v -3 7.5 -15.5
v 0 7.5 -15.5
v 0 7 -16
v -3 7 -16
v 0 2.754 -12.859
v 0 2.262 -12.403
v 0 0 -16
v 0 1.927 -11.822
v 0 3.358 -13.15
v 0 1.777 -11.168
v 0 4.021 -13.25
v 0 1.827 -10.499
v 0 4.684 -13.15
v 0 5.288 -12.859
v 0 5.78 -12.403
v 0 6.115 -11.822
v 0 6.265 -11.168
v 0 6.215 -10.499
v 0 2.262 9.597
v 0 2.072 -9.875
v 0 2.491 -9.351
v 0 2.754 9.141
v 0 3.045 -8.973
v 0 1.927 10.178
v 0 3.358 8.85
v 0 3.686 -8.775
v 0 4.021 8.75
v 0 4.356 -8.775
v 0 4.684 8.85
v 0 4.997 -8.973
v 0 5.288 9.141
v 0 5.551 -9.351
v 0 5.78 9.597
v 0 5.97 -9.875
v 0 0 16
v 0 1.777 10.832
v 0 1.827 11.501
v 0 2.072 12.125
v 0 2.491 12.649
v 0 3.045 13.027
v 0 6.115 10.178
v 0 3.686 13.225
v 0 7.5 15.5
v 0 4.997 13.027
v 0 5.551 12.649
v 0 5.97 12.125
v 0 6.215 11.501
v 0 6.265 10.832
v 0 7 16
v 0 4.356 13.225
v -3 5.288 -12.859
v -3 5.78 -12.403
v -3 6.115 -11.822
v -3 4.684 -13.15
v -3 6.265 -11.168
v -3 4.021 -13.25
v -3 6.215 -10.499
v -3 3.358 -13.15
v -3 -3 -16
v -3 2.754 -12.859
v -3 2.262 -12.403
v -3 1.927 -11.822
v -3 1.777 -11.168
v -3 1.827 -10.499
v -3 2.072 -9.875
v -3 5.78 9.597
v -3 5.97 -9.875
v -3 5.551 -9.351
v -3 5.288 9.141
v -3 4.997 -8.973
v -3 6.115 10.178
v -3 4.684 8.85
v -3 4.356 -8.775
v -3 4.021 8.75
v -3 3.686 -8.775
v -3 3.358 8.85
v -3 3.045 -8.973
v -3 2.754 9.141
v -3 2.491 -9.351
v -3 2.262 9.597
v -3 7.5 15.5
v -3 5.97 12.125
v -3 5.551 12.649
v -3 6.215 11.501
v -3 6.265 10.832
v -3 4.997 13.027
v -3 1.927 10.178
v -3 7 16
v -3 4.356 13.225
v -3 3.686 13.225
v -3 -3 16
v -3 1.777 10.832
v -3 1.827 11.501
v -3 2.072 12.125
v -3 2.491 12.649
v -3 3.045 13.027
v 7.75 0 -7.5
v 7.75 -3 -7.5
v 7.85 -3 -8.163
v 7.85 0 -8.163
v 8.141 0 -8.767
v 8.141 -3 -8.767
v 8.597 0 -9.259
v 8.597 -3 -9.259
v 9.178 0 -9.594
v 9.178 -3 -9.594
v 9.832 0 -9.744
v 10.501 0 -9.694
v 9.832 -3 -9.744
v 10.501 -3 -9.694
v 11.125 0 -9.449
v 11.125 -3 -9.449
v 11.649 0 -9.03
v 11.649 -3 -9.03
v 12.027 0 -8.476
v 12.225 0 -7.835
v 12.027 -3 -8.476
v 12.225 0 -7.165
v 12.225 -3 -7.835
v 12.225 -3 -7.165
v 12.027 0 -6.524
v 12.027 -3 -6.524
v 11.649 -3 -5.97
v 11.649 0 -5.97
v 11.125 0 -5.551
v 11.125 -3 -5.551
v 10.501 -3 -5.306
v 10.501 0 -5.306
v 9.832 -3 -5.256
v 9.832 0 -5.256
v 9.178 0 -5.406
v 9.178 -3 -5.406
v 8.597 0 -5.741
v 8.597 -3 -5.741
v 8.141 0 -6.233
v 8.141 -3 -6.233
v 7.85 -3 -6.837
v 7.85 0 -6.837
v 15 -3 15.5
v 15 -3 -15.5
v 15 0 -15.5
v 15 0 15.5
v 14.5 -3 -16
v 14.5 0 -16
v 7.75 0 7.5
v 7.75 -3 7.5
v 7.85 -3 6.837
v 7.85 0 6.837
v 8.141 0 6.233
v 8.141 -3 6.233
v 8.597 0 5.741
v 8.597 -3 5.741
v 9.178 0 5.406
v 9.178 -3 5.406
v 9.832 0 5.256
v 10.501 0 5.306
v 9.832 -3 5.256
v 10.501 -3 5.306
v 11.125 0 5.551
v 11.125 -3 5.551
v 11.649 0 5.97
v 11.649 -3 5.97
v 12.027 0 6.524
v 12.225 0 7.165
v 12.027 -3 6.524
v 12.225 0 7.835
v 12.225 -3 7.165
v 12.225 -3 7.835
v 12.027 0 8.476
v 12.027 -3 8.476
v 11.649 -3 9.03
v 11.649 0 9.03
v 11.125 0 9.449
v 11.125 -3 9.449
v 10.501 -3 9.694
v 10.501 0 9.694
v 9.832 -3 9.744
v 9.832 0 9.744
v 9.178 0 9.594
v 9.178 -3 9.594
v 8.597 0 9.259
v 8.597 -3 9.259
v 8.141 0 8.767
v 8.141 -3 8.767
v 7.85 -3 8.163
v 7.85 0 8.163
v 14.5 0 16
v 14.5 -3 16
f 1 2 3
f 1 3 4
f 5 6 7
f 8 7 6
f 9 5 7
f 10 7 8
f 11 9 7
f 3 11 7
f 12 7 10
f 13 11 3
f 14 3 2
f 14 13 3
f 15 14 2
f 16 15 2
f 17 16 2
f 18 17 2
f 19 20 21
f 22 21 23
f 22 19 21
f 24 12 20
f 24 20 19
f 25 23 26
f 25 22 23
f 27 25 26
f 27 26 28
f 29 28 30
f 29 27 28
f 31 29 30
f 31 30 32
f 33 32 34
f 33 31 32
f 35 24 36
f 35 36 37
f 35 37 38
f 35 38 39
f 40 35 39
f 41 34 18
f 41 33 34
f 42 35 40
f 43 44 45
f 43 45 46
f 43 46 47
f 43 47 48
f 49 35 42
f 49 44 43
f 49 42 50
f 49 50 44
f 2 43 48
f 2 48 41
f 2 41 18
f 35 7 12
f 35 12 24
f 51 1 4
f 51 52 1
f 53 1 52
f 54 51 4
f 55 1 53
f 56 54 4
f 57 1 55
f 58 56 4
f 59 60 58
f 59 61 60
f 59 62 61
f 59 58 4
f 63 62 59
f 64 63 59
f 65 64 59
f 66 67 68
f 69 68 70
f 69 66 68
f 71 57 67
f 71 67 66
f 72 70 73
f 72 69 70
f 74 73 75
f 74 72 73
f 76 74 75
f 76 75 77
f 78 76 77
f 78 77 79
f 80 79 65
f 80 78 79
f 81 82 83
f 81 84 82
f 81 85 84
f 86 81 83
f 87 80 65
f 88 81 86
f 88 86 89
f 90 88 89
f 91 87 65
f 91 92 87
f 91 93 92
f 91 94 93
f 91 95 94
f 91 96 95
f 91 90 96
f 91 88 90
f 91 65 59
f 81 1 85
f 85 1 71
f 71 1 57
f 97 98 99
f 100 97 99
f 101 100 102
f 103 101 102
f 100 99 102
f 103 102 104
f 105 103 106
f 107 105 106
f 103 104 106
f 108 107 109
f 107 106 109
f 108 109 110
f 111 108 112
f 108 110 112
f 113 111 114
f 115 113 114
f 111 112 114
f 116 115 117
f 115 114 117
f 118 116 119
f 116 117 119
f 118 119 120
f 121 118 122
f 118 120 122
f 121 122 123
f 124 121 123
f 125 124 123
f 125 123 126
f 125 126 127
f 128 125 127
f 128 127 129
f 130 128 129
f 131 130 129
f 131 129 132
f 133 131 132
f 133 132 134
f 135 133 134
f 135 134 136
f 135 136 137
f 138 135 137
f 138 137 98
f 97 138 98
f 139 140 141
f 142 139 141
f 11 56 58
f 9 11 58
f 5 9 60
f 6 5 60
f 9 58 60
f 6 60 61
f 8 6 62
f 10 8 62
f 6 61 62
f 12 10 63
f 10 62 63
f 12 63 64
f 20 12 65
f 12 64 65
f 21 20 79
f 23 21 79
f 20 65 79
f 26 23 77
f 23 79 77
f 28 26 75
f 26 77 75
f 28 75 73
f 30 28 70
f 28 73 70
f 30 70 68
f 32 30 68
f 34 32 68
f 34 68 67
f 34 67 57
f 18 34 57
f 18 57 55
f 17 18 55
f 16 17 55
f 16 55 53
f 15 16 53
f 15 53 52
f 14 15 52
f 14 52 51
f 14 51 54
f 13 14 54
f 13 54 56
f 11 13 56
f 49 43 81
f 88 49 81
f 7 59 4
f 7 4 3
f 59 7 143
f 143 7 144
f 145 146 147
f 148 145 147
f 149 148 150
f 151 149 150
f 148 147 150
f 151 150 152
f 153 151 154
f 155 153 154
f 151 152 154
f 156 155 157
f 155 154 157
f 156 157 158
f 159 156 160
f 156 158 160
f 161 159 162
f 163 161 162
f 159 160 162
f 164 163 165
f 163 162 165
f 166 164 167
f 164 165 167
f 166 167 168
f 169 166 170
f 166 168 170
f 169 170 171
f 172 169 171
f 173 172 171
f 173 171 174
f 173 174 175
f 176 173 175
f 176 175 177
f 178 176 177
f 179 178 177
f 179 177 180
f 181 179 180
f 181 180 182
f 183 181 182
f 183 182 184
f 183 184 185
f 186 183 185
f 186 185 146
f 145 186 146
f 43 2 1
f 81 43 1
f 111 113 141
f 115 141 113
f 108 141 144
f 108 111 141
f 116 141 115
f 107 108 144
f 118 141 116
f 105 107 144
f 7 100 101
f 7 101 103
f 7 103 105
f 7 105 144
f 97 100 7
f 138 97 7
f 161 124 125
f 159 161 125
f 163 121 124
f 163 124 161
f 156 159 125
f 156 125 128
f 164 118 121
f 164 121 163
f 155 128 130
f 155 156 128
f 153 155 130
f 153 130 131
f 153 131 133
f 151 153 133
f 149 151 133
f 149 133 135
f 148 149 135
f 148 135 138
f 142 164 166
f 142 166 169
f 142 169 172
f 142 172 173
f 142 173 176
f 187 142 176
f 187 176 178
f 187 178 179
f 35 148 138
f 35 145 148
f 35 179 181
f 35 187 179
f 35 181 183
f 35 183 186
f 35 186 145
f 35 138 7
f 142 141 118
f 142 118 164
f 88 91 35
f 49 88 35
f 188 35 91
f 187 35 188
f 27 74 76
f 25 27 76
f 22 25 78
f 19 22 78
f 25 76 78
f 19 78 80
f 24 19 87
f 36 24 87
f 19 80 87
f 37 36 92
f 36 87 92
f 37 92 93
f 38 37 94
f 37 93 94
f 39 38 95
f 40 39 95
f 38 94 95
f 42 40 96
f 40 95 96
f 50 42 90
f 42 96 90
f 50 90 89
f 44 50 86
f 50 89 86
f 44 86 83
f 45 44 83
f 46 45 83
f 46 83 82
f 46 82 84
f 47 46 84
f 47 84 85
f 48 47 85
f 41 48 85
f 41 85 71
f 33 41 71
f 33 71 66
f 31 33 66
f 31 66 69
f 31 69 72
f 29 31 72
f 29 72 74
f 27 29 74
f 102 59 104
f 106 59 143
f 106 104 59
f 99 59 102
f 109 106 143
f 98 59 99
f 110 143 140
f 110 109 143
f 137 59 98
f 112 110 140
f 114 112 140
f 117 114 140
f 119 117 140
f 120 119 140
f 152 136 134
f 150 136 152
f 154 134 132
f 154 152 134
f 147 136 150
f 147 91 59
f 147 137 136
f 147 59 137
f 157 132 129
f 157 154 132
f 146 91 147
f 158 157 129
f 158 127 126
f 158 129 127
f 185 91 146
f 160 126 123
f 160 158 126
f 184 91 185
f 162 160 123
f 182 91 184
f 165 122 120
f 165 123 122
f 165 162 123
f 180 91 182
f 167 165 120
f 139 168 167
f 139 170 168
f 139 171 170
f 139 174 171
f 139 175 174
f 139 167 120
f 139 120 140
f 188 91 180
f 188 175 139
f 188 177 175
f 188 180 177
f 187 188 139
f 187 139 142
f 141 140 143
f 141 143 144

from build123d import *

# Parameters (mm, degrees)
EXTRUDE_1_DEPTH             = 16
HOLE_WIZARD_4_5_4_5_1_D     = 4.5
HOLE_WIZARD_4_5_4_5_1_DEPTH = 5
HOLE_WIZARD_4_5_4_5_1_TIP   = 1.351936393
HOLE_WIZARD_4_5_4_5_2_D     = 4.5
HOLE_WIZARD_4_5_4_5_2_DEPTH = 5
HOLE_WIZARD_4_5_4_5_2_TIP   = 1.351936393
CHAMFER_1_SIZE              = 0.5


with BuildPart() as part:
    # 草图6 → 拉伸-薄壁1 (new, symmetric)
    with BuildSketch(Plane.XY):
        Polygon((15, 0), (0, 0), (0, 7.5), (-3, 7.5), (-3, -3), (15, -3), align=None)
    extrude(amount=EXTRUDE_1_DEPTH, both=True)

    # Ø4.5 (4.5) 直径孔1
    with Locations(Plane(origin=(0, -1.729, -9.85), x_dir=(0, 0, 1), z_dir=(1, 0, 0))):
        with Locations((-1.15, -5.75), (20.85, -5.75)):
            Hole(HOLE_WIZARD_4_5_4_5_1_D / 2, depth=HOLE_WIZARD_4_5_4_5_1_DEPTH)
            with Locations((0, 0, -(HOLE_WIZARD_4_5_4_5_1_DEPTH + HOLE_WIZARD_4_5_4_5_1_TIP / 2))):  # 118° drill point
                Cone(0, HOLE_WIZARD_4_5_4_5_1_D / 2, HOLE_WIZARD_4_5_4_5_1_TIP, mode=Mode.SUBTRACT)

    # Ø4.5 (4.5) 直径孔2
    with Locations(Plane(origin=(0, 0, 0), x_dir=(1, 0, 0), z_dir=(0, 1, 0))):
        with Locations((10, -7.5), (10, 7.5)):
            Hole(HOLE_WIZARD_4_5_4_5_2_D / 2, depth=HOLE_WIZARD_4_5_4_5_2_DEPTH)
            with Locations((0, 0, -(HOLE_WIZARD_4_5_4_5_2_DEPTH + HOLE_WIZARD_4_5_4_5_2_TIP / 2))):  # 118° drill point
                Cone(0, HOLE_WIZARD_4_5_4_5_2_D / 2, HOLE_WIZARD_4_5_4_5_2_TIP, mode=Mode.SUBTRACT)

    # 倒角1
    chamfer_1_edges = [part.edges().sort_by_distance(p)[0] for p in [
        (-1.5, 7.5, 16),
        (-1.5, 7.5, -16),
        (15, -1.5, -16),
        (15, -1.5, 16),
    ]]
    chamfer(chamfer_1_edges, length=CHAMFER_1_SIZE)


solid = part.part
